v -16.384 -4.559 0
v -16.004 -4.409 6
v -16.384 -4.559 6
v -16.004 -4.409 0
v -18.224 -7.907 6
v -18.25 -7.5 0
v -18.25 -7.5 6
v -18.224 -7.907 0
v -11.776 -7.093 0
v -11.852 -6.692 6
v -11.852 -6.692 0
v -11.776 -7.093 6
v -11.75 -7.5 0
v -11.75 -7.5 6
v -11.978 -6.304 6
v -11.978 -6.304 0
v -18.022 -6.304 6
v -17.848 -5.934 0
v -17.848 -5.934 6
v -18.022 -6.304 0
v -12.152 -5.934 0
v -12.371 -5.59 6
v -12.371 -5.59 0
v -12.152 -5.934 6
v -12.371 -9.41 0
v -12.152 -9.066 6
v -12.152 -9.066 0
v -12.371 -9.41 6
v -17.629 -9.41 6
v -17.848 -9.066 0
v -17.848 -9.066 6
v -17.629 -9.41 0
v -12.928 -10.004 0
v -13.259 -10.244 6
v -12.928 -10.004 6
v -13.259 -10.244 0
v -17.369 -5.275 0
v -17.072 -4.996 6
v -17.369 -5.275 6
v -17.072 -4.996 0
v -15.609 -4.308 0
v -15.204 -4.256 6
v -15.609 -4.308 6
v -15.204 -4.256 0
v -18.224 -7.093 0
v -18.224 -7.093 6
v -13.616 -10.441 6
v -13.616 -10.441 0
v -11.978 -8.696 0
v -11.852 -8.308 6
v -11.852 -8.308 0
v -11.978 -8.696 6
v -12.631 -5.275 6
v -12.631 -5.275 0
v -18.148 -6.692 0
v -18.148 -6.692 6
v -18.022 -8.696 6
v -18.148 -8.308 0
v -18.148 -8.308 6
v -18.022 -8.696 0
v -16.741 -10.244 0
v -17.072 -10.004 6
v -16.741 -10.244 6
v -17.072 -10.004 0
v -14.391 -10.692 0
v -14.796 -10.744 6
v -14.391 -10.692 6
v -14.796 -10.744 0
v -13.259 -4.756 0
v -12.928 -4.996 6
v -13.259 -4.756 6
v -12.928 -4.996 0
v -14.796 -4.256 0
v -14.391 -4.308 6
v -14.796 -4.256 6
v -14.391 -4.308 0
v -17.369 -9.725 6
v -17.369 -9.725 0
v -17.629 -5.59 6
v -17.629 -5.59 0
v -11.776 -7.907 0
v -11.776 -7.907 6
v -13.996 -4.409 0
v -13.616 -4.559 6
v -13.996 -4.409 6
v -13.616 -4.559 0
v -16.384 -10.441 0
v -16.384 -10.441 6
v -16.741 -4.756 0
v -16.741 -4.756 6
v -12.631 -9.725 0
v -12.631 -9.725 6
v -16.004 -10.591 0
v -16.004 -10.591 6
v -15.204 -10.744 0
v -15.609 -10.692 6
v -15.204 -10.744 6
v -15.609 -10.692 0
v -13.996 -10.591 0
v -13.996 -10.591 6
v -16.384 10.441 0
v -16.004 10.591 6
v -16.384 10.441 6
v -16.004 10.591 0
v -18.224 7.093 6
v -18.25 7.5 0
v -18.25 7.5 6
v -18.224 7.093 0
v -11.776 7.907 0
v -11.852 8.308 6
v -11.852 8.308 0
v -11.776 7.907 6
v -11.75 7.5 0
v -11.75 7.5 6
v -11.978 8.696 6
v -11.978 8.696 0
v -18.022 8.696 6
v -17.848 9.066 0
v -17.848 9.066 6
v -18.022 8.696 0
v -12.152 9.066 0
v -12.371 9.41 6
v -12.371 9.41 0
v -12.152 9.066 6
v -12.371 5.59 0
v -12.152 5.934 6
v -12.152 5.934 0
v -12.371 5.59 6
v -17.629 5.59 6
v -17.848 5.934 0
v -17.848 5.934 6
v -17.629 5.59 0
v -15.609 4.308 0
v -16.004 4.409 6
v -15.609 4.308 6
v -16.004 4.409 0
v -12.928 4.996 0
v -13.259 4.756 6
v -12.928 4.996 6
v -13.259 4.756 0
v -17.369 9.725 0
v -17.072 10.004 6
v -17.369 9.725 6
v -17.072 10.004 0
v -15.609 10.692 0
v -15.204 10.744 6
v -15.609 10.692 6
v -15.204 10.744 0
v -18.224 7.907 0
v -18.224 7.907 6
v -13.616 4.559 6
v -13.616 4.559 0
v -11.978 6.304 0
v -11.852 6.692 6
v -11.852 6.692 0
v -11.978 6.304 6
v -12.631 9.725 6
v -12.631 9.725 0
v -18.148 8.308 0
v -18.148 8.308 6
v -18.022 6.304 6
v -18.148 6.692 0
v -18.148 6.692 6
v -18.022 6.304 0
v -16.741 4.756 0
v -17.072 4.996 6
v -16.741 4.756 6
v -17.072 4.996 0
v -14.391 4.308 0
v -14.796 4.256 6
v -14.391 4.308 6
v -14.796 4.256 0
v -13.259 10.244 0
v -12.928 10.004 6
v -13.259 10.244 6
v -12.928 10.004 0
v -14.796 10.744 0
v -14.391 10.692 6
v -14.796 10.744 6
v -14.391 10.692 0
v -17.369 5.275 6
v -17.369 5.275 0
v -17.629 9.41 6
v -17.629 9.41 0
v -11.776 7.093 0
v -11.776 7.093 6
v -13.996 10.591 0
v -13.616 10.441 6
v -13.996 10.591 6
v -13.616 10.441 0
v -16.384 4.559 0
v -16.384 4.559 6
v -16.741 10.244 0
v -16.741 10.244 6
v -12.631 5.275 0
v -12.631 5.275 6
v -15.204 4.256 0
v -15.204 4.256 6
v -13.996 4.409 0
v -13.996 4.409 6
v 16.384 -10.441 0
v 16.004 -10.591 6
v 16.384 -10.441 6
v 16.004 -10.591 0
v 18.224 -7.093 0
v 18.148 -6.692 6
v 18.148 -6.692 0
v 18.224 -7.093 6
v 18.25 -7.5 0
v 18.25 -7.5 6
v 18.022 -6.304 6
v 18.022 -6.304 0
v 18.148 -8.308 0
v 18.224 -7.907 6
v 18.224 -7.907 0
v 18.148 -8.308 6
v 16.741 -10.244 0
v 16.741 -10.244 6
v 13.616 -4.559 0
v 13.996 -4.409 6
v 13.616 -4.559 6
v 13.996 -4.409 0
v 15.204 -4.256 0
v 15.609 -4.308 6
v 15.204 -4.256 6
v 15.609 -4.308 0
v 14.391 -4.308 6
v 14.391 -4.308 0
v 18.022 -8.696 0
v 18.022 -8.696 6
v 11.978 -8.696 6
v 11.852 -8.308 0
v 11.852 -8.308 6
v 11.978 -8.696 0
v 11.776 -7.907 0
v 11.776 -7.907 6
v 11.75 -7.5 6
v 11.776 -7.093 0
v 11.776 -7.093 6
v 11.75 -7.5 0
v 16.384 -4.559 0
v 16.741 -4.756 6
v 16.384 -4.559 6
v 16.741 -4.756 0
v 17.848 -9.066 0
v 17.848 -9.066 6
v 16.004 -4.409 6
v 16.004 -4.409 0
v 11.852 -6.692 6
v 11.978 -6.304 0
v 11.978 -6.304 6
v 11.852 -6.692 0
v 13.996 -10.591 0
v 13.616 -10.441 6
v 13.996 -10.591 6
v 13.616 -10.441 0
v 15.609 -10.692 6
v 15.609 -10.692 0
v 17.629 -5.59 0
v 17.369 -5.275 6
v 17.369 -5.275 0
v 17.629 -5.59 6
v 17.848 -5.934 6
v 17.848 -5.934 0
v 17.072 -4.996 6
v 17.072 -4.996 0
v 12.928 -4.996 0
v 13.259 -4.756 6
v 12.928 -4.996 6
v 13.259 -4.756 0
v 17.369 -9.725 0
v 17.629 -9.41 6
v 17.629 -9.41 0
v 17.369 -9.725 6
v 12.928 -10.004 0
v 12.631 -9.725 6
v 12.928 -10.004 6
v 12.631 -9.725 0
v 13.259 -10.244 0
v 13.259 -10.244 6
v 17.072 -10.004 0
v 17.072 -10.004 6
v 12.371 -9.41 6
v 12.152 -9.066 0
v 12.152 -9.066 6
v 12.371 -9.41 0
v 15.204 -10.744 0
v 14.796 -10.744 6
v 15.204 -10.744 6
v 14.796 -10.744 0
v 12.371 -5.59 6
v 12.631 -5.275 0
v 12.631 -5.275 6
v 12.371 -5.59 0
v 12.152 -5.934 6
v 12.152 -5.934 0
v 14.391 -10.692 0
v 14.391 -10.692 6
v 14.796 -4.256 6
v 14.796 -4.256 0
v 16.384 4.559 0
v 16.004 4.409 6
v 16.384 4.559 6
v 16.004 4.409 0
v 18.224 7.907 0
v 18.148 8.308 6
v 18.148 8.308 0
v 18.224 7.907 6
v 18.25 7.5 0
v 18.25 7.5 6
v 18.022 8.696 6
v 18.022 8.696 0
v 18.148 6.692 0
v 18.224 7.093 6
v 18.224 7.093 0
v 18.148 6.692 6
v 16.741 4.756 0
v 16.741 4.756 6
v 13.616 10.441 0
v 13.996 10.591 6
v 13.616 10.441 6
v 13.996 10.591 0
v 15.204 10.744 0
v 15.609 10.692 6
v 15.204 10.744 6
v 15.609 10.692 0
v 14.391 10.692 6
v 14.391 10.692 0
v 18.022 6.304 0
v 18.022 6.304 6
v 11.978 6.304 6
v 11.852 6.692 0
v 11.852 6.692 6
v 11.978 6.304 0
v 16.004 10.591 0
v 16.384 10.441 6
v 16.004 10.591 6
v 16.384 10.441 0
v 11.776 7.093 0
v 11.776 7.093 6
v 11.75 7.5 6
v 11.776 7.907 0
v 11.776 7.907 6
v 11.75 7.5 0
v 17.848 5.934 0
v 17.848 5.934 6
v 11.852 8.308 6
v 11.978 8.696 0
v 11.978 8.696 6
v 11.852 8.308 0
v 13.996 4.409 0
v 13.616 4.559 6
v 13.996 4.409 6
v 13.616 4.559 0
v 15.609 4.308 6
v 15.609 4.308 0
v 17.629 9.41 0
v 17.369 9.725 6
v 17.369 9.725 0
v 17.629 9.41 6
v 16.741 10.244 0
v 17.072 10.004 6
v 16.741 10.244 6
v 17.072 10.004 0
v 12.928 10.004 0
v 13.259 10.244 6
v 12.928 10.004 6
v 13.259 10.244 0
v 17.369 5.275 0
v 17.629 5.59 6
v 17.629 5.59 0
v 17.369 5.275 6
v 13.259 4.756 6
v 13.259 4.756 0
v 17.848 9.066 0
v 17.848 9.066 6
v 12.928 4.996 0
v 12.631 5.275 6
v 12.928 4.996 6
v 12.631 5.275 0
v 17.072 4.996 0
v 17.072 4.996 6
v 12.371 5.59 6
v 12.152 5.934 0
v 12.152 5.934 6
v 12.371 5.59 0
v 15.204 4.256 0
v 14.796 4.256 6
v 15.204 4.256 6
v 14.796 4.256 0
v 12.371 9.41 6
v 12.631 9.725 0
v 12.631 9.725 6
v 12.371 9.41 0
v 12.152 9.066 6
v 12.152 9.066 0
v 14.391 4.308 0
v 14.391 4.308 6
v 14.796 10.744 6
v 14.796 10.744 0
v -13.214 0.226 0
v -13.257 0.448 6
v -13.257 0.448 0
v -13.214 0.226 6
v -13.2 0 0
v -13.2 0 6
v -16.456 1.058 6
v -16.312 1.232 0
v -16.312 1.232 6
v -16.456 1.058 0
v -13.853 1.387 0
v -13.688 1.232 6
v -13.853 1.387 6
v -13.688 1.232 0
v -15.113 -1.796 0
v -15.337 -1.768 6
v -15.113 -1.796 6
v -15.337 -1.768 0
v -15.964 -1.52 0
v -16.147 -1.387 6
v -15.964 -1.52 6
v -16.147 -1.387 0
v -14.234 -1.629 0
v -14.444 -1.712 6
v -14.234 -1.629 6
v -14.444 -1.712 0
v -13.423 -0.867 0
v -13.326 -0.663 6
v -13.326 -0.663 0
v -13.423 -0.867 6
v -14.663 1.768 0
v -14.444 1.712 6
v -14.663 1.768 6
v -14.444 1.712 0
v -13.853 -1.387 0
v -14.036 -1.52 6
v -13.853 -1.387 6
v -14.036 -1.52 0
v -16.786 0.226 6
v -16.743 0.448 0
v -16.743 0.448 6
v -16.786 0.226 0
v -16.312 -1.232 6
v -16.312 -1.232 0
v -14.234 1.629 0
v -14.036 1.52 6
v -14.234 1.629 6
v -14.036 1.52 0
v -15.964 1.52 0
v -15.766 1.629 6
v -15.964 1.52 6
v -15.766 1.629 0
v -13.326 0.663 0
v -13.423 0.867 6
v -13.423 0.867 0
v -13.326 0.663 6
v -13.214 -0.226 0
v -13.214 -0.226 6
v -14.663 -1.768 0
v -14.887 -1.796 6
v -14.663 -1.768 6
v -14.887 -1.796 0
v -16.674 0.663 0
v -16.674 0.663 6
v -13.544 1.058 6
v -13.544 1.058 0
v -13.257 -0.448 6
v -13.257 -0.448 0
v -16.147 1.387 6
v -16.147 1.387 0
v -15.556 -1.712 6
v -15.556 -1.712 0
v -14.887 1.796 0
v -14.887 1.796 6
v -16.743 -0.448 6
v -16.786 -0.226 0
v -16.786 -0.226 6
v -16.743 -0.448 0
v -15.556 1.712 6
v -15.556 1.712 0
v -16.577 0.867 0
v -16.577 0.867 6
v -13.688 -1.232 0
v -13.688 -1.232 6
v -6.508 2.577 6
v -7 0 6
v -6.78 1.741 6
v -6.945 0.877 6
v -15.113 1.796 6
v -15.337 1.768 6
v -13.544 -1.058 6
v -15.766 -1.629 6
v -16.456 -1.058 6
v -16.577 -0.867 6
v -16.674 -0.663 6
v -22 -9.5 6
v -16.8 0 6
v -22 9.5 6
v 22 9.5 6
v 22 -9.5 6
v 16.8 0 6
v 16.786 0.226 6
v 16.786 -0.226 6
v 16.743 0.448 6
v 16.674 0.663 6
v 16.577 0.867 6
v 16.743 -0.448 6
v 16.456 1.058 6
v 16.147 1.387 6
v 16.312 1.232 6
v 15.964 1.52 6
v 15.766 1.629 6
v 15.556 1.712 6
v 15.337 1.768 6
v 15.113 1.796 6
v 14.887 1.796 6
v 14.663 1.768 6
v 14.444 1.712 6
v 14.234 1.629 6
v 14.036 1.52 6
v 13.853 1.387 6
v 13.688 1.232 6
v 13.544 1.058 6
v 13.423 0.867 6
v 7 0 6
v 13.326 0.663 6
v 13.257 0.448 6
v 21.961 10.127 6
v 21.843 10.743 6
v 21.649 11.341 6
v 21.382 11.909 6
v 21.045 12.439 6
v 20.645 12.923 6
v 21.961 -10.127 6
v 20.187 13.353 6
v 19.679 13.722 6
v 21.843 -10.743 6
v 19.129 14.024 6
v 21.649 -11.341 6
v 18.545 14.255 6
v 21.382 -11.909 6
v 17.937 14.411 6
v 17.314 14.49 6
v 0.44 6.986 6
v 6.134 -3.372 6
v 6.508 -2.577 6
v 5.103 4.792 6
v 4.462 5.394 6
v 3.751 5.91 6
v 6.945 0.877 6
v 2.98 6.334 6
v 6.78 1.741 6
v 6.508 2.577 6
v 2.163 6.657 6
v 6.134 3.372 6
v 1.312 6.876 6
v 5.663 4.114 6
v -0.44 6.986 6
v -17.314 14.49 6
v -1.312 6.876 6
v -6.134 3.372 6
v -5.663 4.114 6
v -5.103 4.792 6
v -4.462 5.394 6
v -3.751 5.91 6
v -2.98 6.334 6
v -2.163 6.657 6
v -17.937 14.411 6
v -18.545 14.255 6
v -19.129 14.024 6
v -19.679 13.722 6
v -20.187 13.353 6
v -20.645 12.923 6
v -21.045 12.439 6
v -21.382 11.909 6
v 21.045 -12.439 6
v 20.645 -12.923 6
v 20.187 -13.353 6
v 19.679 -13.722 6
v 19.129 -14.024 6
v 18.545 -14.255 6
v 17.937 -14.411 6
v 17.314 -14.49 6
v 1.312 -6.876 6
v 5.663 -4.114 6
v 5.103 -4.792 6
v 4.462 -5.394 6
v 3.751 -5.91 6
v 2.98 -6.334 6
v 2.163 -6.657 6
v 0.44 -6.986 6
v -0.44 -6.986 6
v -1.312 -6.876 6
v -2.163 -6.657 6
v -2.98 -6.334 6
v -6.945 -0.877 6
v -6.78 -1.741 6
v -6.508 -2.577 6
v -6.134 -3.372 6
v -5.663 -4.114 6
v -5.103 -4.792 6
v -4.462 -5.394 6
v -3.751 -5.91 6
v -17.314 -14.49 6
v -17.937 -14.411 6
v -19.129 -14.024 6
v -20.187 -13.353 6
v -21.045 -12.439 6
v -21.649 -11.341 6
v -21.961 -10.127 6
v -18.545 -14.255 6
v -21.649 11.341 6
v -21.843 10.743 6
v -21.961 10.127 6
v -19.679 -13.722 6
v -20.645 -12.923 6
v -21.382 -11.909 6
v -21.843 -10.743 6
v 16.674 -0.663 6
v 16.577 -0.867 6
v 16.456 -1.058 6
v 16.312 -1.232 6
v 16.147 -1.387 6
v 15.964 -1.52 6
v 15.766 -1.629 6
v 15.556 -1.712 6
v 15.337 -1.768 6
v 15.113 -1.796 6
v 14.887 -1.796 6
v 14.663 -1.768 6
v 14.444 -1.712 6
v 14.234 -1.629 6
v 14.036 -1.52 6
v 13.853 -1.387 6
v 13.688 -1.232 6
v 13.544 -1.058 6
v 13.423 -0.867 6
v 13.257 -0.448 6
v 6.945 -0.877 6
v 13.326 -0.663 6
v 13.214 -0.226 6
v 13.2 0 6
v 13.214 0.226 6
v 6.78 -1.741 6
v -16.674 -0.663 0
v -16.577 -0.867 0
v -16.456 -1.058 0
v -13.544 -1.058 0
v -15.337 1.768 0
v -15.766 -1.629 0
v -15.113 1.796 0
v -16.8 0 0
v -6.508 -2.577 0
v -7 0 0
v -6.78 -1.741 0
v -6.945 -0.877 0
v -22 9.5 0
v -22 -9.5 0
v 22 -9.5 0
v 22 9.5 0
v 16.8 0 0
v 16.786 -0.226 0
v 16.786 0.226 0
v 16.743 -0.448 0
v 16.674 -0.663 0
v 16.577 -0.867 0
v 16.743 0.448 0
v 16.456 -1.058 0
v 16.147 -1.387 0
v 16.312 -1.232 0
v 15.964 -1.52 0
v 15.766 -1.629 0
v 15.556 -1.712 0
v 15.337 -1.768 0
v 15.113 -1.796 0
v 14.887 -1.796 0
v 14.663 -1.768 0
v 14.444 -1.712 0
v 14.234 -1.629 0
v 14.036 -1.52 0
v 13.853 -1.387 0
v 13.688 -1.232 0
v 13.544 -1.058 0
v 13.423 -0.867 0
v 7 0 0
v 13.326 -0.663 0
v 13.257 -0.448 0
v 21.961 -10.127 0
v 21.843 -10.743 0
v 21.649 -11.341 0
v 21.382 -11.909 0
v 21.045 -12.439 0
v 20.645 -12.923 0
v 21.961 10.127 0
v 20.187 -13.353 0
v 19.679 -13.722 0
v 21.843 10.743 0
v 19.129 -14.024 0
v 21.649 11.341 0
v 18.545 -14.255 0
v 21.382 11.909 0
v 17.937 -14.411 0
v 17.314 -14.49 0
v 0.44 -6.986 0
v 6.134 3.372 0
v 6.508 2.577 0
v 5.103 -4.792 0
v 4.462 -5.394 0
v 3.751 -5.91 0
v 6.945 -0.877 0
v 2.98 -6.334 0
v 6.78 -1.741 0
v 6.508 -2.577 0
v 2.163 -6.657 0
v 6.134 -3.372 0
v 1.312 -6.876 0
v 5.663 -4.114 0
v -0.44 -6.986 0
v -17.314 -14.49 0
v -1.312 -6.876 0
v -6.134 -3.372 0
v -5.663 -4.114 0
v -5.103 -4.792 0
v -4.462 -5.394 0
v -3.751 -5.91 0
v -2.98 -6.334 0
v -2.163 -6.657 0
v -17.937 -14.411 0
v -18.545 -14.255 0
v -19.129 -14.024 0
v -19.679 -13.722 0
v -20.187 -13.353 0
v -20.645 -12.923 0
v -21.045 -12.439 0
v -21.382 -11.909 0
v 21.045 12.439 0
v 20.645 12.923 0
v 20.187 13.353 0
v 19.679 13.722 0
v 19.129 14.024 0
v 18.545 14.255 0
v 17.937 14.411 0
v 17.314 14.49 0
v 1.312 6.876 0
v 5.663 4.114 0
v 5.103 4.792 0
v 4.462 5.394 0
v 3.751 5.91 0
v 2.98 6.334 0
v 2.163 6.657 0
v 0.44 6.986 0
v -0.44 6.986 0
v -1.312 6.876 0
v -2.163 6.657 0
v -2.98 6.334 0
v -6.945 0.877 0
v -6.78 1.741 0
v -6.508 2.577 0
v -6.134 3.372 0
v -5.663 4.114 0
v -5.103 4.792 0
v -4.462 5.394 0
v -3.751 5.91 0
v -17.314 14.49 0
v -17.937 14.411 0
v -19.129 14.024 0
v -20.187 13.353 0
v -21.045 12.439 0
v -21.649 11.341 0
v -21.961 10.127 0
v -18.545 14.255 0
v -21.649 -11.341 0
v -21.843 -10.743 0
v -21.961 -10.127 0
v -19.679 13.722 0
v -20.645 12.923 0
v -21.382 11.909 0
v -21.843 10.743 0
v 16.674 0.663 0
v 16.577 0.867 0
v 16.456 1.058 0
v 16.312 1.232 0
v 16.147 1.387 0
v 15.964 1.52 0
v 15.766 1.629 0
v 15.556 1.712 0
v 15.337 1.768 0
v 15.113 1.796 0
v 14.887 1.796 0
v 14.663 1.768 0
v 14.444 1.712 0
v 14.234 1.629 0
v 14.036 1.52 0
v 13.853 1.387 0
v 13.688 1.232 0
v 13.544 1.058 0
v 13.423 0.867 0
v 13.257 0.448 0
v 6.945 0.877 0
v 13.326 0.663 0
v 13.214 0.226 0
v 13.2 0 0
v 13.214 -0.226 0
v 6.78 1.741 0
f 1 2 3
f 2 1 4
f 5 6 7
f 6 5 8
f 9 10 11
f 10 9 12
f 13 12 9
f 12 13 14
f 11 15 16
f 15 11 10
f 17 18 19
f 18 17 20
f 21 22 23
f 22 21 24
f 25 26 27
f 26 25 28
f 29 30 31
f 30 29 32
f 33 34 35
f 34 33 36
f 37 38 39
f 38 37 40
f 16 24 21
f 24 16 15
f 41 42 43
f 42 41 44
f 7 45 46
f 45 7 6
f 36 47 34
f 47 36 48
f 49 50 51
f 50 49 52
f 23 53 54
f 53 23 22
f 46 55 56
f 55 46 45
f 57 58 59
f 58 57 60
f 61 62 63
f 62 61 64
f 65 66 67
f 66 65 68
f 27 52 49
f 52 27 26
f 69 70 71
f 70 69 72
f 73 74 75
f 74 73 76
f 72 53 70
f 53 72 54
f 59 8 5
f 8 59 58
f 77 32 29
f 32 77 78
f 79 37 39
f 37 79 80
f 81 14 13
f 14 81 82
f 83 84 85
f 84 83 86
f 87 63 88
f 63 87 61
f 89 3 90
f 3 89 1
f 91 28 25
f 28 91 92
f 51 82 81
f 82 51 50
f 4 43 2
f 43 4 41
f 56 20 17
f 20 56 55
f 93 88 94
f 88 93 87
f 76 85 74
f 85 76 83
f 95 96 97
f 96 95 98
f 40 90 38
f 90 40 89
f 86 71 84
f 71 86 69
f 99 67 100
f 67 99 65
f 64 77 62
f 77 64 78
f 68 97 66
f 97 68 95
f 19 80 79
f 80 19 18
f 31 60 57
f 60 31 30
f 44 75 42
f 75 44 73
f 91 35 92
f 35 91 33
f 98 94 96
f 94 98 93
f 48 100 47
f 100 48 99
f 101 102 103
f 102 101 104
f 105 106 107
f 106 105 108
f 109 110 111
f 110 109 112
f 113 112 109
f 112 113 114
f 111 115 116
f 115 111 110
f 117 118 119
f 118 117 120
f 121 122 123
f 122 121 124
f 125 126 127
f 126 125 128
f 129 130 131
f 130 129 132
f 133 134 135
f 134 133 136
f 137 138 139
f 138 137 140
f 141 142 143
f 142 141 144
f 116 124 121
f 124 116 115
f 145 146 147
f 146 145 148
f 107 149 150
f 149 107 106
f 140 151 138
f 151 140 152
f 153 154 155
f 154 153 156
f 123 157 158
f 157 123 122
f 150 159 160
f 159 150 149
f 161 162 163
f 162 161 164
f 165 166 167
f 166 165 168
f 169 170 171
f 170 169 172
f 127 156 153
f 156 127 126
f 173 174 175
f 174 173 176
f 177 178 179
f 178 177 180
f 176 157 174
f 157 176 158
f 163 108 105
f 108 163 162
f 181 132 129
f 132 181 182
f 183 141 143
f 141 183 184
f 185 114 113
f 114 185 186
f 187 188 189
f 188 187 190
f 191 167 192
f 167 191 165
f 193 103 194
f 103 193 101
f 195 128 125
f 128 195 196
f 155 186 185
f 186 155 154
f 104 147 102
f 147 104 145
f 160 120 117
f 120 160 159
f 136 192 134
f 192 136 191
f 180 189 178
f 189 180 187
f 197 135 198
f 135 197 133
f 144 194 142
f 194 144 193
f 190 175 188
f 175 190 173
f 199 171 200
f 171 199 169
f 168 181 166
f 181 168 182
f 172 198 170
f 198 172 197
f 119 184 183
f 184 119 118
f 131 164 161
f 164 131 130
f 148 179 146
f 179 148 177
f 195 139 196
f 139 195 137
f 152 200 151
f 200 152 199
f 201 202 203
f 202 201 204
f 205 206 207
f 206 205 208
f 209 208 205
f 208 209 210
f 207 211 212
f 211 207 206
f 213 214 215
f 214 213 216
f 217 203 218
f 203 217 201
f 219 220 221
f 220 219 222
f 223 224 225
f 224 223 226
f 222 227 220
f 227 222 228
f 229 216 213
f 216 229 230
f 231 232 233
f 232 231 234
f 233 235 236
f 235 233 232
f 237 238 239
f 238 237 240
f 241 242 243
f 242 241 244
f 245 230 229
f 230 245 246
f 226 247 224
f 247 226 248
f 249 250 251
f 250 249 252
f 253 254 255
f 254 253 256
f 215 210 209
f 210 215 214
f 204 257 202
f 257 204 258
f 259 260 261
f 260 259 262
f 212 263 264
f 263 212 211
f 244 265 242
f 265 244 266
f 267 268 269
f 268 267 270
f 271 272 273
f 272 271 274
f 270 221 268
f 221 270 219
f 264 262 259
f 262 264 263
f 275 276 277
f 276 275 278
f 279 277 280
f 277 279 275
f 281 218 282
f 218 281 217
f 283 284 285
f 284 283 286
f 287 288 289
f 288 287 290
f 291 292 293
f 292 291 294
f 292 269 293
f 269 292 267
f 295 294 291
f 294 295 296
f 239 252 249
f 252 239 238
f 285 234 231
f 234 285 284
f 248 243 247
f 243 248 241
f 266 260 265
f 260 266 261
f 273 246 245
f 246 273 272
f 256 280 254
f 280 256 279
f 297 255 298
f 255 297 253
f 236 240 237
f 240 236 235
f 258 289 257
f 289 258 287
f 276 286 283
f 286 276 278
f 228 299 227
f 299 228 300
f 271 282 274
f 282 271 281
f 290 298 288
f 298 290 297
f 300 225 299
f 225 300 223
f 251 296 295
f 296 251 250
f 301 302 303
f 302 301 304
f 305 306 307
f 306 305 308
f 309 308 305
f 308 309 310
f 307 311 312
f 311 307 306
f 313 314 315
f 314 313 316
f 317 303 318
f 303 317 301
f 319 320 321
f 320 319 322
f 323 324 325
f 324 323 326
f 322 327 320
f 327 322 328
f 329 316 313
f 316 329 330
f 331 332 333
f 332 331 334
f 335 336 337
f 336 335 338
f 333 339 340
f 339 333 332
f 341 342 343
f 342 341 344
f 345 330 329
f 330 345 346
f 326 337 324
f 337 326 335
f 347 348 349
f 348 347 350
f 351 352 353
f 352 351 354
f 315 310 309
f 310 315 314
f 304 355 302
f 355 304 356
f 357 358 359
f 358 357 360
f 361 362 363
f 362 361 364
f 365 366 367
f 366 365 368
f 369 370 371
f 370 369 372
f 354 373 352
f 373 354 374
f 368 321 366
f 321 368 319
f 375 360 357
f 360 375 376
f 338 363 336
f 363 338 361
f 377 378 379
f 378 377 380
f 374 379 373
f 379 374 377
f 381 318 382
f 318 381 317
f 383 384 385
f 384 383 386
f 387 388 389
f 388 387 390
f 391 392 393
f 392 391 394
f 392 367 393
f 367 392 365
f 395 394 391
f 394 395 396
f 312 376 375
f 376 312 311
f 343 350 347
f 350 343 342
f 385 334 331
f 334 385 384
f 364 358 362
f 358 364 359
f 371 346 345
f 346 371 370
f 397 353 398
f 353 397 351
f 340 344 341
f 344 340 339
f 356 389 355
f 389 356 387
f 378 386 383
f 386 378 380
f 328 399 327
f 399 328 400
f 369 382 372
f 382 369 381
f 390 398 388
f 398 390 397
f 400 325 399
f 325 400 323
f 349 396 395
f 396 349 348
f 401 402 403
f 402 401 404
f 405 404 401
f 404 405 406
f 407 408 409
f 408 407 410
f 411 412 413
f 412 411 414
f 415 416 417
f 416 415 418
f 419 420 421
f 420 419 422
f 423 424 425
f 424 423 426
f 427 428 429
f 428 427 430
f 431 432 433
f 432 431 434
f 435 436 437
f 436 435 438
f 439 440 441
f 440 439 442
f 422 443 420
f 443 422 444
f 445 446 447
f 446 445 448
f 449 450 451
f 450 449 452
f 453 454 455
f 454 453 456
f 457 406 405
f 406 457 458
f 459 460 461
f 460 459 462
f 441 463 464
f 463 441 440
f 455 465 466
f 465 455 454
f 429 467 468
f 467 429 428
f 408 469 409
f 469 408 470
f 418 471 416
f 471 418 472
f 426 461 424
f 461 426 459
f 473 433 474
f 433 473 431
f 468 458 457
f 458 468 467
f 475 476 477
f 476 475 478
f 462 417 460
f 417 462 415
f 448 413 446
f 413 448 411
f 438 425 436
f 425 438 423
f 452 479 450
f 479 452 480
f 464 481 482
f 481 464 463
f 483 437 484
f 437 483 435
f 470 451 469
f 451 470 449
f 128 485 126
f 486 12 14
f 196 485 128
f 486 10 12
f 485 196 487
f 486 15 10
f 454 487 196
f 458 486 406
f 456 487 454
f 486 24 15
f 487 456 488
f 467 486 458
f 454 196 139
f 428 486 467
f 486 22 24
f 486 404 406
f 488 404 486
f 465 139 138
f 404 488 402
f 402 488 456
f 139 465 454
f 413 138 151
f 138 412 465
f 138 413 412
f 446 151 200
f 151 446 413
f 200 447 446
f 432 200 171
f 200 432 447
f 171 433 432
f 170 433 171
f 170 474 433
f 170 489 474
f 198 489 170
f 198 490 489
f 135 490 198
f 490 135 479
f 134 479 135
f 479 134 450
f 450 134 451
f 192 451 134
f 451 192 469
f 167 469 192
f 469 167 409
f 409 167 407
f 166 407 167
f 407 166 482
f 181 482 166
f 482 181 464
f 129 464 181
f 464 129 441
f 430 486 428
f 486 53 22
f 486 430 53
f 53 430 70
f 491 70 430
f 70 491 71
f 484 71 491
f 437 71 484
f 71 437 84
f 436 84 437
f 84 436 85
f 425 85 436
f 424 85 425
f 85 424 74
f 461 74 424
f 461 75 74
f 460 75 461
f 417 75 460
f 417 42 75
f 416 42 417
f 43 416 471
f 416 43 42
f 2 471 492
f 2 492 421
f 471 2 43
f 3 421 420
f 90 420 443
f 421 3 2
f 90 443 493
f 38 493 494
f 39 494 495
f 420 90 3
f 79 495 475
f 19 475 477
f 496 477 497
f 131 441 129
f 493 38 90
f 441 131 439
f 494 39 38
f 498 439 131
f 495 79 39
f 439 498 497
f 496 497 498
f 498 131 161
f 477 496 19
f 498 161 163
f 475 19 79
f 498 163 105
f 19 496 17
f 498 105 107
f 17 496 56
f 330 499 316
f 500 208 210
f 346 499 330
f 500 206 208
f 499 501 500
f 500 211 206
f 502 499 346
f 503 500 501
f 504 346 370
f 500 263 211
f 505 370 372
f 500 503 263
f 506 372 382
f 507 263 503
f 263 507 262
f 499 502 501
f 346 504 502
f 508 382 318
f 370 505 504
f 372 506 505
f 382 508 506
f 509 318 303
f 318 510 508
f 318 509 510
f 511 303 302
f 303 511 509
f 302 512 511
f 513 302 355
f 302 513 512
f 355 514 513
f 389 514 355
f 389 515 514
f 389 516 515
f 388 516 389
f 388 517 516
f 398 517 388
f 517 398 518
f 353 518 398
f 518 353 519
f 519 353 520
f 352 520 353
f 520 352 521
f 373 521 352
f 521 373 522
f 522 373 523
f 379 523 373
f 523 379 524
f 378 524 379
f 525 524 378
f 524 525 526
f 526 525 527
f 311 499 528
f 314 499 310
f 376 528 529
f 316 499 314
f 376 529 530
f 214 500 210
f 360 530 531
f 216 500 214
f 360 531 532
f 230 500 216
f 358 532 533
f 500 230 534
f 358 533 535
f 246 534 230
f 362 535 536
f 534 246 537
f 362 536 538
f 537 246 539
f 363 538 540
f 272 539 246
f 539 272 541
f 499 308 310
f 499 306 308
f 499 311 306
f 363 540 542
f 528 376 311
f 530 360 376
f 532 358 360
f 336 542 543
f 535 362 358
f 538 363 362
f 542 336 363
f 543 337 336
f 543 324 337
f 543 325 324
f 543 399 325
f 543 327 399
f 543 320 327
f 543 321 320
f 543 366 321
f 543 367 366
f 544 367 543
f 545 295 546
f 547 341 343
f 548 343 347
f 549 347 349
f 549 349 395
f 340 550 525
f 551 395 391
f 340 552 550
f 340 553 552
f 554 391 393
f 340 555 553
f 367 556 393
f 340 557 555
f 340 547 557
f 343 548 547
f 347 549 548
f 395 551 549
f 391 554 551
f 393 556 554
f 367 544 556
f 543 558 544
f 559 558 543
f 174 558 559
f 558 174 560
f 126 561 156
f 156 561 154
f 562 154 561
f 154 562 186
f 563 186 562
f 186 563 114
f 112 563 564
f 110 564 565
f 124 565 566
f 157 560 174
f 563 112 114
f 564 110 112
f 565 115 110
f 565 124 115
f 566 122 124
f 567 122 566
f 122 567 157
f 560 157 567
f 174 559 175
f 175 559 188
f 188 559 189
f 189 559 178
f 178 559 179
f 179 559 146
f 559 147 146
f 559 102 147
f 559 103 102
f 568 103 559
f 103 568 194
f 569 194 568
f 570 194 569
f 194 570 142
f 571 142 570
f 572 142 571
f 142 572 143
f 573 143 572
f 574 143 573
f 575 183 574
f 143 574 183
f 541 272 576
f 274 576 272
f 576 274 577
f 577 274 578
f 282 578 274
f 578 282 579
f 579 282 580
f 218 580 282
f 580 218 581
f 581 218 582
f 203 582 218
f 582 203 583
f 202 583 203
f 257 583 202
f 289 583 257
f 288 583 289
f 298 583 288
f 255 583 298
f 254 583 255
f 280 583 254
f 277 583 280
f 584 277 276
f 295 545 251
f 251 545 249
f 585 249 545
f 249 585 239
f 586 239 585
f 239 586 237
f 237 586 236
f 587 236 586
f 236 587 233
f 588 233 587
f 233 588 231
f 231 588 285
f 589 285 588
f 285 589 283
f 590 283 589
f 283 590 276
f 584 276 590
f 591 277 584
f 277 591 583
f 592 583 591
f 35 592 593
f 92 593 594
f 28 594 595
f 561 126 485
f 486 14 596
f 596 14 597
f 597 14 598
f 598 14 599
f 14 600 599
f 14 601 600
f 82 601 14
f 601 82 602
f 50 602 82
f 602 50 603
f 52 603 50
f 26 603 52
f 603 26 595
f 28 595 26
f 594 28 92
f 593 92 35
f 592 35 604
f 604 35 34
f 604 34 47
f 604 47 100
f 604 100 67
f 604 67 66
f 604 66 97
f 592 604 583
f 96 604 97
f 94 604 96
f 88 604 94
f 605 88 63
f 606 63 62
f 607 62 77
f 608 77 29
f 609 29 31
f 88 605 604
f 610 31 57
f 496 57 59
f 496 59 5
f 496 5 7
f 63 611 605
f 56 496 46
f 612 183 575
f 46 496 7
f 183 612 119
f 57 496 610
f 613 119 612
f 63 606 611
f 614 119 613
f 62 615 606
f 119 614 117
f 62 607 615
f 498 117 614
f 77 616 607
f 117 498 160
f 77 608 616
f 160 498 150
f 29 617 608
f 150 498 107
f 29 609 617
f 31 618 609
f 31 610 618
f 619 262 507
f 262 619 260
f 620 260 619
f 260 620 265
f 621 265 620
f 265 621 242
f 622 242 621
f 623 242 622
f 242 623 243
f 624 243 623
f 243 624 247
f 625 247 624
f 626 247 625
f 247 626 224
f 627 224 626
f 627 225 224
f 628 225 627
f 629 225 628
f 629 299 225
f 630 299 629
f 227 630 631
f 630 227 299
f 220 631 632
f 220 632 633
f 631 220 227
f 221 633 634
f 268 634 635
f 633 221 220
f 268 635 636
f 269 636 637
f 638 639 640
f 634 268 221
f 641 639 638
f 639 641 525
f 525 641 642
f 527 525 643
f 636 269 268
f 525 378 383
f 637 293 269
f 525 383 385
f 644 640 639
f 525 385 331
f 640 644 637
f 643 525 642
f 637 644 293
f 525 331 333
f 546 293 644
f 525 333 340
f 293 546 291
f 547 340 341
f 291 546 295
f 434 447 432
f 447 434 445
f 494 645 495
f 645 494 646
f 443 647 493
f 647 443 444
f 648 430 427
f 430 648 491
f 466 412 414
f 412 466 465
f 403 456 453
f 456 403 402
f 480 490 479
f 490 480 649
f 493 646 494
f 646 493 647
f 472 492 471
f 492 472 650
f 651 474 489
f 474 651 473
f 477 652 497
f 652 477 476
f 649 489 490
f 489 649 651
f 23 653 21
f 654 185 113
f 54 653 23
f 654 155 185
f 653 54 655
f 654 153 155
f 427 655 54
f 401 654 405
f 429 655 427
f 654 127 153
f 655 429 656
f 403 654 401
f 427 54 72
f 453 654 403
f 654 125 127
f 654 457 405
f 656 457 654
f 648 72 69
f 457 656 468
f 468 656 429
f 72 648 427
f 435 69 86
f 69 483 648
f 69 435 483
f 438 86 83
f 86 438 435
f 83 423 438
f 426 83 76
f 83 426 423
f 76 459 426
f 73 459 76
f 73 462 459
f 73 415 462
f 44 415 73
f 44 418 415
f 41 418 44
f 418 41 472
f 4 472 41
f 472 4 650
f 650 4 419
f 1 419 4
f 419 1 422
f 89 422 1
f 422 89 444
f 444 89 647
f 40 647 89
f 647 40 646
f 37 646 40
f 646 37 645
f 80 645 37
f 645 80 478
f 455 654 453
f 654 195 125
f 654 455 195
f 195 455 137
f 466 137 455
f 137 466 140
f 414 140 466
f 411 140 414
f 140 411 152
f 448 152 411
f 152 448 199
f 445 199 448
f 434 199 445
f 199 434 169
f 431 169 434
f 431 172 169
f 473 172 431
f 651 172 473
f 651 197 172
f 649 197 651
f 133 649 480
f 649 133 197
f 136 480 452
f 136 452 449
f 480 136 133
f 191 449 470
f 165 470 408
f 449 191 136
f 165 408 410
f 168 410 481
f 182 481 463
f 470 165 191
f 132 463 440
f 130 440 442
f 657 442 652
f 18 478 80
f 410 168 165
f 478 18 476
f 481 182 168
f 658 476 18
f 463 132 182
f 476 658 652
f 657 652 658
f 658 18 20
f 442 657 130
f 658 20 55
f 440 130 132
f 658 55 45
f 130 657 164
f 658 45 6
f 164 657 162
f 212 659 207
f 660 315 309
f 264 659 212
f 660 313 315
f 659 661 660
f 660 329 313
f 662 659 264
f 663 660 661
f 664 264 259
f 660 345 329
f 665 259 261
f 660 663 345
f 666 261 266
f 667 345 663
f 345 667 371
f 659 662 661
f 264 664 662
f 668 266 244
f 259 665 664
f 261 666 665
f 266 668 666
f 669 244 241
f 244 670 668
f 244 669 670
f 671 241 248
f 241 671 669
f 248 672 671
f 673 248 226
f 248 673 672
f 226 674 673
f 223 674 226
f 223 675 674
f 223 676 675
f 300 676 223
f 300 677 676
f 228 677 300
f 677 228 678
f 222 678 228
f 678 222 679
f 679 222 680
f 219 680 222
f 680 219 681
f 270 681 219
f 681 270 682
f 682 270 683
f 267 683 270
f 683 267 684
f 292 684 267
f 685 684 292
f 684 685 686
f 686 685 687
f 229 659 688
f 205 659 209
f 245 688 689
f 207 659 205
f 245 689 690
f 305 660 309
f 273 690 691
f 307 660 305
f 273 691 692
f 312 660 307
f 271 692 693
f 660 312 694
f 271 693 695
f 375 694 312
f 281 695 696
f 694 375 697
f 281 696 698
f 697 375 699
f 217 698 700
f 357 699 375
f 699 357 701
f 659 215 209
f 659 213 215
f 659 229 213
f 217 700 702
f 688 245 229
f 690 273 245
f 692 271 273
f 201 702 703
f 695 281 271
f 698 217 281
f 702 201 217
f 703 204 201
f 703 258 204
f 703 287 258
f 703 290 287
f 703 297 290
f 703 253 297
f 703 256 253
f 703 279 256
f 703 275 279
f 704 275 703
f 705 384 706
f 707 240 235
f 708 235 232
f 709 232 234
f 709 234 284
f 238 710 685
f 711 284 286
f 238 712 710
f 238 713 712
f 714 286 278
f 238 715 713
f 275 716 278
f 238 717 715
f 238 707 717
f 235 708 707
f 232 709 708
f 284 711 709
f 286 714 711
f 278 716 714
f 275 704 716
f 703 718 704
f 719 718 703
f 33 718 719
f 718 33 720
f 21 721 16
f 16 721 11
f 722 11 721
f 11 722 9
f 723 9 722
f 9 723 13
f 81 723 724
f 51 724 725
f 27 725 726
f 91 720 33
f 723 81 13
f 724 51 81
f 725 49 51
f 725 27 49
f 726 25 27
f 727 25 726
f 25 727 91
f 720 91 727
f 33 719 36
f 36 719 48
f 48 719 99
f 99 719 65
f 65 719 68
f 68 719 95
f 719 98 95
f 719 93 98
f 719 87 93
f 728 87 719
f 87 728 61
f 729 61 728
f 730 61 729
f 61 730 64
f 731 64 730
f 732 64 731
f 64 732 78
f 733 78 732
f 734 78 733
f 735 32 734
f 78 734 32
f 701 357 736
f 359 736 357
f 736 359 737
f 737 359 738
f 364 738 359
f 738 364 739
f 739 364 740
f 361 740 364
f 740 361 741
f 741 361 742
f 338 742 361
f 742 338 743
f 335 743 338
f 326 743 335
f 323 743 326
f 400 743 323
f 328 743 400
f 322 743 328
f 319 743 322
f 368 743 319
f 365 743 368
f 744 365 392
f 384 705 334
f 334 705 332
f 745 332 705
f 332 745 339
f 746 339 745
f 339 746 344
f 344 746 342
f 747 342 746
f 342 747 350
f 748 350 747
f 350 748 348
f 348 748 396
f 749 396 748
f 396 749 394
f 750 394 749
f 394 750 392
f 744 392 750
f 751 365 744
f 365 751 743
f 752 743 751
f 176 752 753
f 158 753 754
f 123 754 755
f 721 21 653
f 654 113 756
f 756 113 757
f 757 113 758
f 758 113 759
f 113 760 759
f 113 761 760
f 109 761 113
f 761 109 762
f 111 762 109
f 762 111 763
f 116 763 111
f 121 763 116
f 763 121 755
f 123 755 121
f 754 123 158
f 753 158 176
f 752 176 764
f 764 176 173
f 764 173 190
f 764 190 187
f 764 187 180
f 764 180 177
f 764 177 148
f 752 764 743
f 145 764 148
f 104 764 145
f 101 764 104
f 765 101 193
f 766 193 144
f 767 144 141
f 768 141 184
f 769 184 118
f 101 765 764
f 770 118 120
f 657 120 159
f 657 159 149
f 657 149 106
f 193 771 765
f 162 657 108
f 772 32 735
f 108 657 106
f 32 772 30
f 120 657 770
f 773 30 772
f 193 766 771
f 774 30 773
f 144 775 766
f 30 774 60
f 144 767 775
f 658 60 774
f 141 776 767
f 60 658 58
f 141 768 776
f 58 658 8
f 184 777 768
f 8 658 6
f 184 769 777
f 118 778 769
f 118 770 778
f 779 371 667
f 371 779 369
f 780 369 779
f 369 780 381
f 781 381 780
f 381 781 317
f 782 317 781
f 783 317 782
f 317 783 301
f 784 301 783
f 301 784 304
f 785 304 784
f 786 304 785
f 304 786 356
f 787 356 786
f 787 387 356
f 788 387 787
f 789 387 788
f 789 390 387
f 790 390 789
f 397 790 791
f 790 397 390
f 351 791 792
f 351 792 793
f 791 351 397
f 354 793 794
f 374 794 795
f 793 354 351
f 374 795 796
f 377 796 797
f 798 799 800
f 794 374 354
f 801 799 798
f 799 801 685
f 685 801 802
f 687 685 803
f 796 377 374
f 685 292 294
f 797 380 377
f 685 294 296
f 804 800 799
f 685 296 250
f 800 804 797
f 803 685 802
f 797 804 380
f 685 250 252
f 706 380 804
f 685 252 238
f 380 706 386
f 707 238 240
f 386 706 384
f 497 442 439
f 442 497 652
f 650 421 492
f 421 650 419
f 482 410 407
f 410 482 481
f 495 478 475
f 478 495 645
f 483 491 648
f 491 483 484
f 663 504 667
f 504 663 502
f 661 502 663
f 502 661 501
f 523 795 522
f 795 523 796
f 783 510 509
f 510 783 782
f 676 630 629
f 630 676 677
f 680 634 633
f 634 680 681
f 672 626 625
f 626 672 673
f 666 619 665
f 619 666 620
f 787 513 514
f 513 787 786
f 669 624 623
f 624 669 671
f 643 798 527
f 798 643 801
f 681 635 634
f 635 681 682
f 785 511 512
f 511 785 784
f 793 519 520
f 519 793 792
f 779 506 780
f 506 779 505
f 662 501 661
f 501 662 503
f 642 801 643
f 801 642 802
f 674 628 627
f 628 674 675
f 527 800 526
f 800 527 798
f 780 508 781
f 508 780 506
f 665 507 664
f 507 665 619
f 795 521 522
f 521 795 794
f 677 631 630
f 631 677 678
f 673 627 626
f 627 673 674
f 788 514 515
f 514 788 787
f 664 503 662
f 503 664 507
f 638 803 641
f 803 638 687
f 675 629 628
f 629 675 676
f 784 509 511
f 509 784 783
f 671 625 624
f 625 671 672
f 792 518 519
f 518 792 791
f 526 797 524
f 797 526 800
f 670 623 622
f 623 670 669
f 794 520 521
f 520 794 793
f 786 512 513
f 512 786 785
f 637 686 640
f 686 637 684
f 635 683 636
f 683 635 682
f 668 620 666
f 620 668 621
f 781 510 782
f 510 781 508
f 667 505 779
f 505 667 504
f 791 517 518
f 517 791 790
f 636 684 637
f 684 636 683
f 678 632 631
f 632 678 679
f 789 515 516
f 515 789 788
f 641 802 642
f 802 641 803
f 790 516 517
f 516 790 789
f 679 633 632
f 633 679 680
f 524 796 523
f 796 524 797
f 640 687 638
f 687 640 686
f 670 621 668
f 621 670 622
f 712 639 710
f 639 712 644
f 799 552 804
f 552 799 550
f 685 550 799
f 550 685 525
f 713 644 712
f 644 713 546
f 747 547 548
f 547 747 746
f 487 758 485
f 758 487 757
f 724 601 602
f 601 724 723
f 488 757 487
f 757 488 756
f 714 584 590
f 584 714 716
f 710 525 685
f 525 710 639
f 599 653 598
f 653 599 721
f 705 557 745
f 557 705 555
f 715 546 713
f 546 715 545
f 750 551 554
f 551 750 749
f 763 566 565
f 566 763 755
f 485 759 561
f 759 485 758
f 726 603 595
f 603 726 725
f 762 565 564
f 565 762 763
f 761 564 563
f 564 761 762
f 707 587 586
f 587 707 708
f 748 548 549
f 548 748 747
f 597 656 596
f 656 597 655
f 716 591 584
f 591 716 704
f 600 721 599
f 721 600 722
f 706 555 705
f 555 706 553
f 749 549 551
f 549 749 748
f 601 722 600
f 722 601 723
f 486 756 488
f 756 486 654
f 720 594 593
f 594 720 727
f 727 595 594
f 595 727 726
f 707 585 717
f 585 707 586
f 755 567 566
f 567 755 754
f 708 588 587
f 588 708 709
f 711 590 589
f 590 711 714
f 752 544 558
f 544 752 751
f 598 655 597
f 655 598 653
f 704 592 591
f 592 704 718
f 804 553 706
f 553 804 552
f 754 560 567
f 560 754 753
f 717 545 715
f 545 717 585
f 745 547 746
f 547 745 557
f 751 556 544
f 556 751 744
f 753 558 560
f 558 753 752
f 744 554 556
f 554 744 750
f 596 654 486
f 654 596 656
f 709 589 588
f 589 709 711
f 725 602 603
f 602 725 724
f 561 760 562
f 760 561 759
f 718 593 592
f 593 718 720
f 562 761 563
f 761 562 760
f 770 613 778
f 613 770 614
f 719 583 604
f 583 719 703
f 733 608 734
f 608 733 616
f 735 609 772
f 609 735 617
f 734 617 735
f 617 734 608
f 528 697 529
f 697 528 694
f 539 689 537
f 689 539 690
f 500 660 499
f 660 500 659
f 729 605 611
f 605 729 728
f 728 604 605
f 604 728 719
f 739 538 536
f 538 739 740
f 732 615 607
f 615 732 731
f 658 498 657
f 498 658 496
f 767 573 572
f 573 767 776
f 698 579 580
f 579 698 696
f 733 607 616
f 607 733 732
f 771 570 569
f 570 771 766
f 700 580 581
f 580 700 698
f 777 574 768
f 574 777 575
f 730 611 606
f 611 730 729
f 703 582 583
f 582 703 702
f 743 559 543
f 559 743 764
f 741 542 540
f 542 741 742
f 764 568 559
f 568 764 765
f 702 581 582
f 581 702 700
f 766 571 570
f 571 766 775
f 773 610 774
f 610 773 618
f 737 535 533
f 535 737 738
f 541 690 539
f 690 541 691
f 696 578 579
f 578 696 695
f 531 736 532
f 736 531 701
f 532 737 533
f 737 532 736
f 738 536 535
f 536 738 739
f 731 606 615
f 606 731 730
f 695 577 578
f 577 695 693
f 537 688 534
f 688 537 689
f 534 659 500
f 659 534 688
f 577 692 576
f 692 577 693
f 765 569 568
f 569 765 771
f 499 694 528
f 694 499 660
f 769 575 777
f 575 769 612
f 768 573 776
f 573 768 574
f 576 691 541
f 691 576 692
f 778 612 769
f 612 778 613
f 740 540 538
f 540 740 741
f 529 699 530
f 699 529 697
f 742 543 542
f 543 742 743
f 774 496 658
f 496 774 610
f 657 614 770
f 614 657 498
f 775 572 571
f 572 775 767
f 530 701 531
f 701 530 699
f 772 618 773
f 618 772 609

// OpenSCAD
$fn = 50;


difference() {
	union() {
		hull() {
			translate(v = [-17.0000000000, 9.5000000000, 0]) {
				cylinder(h = 6, r = 5);
			}
			translate(v = [17.0000000000, 9.5000000000, 0]) {
				cylinder(h = 6, r = 5);
			}
			translate(v = [-17.0000000000, -9.5000000000, 0]) {
				cylinder(h = 6, r = 5);
			}
			translate(v = [17.0000000000, -9.5000000000, 0]) {
				cylinder(h = 6, r = 5);
			}
		}
	}
	union() {
		#translate(v = [-15.0000000000, -7.5000000000, 0]) {
			cylinder(h = 6, r = 3.2500000000);
		}
		#translate(v = [-15.0000000000, 7.5000000000, 0]) {
			cylinder(h = 6, r = 3.2500000000);
		}
		#translate(v = [15.0000000000, -7.5000000000, 0]) {
			cylinder(h = 6, r = 3.2500000000);
		}
		#translate(v = [15.0000000000, 7.5000000000, 0]) {
			cylinder(h = 6, r = 3.2500000000);
		}
		#translate(v = [-15.0000000000, -7.5000000000, -100.0000000000]) {
			cylinder(h = 200, r = 3.2500000000);
		}
		#translate(v = [-15.0000000000, 7.5000000000, -100.0000000000]) {
			cylinder(h = 200, r = 3.2500000000);
		}
		#translate(v = [15.0000000000, -7.5000000000, -100.0000000000]) {
			cylinder(h = 200, r = 3.2500000000);
		}
		#translate(v = [15.0000000000, 7.5000000000, -100.0000000000]) {
			cylinder(h = 200, r = 3.2500000000);
		}
		#translate(v = [-15.0000000000, -7.5000000000, 0]) {
			cylinder(h = 6, r = 1.8000000000);
		}
		#translate(v = [-15.0000000000, 0.0000000000, 0]) {
			cylinder(h = 6, r = 1.8000000000);
		}
		#translate(v = [-15.0000000000, 7.5000000000, 0]) {
			cylinder(h = 6, r = 1.8000000000);
		}
		#translate(v = [15.0000000000, -7.5000000000, 0]) {
			cylinder(h = 6, r = 1.8000000000);
		}
		#translate(v = [15.0000000000, 0.0000000000, 0]) {
			cylinder(h = 6, r = 1.8000000000);
		}
		#translate(v = [15.0000000000, 7.5000000000, 0]) {
			cylinder(h = 6, r = 1.8000000000);
		}
		#translate(v = [-15.0000000000, -7.5000000000, 0]) {
			cylinder(h = 6, r = 1.8000000000);
		}
		#translate(v = [-15.0000000000, 0.0000000000, 0]) {
			cylinder(h = 6, r = 1.8000000000);
		}
		#translate(v = [-15.0000000000, 7.5000000000, 0]) {
			cylinder(h = 6, r = 1.8000000000);
		}
		#translate(v = [15.0000000000, -7.5000000000, 0]) {
			cylinder(h = 6, r = 1.8000000000);
		}
		#translate(v = [15.0000000000, 0.0000000000, 0]) {
			cylinder(h = 6, r = 1.8000000000);
		}
		#translate(v = [15.0000000000, 7.5000000000, 0]) {
			cylinder(h = 6, r = 1.8000000000);
		}
		#translate(v = [-15.0000000000, -7.5000000000, 0]) {
			cylinder(h = 6, r = 1.8000000000);
		}
		#translate(v = [-15.0000000000, 0.0000000000, 0]) {
			cylinder(h = 6, r = 1.8000000000);
		}
		#translate(v = [-15.0000000000, 7.5000000000, 0]) {
			cylinder(h = 6, r = 1.8000000000);
		}
		#translate(v = [15.0000000000, -7.5000000000, 0]) {
			cylinder(h = 6, r = 1.8000000000);
		}
		#translate(v = [15.0000000000, 0.0000000000, 0]) {
			cylinder(h = 6, r = 1.8000000000);
		}
		#translate(v = [15.0000000000, 7.5000000000, 0]) {
			cylinder(h = 6, r = 1.8000000000);
		}
		#cylinder(h = 6, r = 7.0000000000);
	}
}
